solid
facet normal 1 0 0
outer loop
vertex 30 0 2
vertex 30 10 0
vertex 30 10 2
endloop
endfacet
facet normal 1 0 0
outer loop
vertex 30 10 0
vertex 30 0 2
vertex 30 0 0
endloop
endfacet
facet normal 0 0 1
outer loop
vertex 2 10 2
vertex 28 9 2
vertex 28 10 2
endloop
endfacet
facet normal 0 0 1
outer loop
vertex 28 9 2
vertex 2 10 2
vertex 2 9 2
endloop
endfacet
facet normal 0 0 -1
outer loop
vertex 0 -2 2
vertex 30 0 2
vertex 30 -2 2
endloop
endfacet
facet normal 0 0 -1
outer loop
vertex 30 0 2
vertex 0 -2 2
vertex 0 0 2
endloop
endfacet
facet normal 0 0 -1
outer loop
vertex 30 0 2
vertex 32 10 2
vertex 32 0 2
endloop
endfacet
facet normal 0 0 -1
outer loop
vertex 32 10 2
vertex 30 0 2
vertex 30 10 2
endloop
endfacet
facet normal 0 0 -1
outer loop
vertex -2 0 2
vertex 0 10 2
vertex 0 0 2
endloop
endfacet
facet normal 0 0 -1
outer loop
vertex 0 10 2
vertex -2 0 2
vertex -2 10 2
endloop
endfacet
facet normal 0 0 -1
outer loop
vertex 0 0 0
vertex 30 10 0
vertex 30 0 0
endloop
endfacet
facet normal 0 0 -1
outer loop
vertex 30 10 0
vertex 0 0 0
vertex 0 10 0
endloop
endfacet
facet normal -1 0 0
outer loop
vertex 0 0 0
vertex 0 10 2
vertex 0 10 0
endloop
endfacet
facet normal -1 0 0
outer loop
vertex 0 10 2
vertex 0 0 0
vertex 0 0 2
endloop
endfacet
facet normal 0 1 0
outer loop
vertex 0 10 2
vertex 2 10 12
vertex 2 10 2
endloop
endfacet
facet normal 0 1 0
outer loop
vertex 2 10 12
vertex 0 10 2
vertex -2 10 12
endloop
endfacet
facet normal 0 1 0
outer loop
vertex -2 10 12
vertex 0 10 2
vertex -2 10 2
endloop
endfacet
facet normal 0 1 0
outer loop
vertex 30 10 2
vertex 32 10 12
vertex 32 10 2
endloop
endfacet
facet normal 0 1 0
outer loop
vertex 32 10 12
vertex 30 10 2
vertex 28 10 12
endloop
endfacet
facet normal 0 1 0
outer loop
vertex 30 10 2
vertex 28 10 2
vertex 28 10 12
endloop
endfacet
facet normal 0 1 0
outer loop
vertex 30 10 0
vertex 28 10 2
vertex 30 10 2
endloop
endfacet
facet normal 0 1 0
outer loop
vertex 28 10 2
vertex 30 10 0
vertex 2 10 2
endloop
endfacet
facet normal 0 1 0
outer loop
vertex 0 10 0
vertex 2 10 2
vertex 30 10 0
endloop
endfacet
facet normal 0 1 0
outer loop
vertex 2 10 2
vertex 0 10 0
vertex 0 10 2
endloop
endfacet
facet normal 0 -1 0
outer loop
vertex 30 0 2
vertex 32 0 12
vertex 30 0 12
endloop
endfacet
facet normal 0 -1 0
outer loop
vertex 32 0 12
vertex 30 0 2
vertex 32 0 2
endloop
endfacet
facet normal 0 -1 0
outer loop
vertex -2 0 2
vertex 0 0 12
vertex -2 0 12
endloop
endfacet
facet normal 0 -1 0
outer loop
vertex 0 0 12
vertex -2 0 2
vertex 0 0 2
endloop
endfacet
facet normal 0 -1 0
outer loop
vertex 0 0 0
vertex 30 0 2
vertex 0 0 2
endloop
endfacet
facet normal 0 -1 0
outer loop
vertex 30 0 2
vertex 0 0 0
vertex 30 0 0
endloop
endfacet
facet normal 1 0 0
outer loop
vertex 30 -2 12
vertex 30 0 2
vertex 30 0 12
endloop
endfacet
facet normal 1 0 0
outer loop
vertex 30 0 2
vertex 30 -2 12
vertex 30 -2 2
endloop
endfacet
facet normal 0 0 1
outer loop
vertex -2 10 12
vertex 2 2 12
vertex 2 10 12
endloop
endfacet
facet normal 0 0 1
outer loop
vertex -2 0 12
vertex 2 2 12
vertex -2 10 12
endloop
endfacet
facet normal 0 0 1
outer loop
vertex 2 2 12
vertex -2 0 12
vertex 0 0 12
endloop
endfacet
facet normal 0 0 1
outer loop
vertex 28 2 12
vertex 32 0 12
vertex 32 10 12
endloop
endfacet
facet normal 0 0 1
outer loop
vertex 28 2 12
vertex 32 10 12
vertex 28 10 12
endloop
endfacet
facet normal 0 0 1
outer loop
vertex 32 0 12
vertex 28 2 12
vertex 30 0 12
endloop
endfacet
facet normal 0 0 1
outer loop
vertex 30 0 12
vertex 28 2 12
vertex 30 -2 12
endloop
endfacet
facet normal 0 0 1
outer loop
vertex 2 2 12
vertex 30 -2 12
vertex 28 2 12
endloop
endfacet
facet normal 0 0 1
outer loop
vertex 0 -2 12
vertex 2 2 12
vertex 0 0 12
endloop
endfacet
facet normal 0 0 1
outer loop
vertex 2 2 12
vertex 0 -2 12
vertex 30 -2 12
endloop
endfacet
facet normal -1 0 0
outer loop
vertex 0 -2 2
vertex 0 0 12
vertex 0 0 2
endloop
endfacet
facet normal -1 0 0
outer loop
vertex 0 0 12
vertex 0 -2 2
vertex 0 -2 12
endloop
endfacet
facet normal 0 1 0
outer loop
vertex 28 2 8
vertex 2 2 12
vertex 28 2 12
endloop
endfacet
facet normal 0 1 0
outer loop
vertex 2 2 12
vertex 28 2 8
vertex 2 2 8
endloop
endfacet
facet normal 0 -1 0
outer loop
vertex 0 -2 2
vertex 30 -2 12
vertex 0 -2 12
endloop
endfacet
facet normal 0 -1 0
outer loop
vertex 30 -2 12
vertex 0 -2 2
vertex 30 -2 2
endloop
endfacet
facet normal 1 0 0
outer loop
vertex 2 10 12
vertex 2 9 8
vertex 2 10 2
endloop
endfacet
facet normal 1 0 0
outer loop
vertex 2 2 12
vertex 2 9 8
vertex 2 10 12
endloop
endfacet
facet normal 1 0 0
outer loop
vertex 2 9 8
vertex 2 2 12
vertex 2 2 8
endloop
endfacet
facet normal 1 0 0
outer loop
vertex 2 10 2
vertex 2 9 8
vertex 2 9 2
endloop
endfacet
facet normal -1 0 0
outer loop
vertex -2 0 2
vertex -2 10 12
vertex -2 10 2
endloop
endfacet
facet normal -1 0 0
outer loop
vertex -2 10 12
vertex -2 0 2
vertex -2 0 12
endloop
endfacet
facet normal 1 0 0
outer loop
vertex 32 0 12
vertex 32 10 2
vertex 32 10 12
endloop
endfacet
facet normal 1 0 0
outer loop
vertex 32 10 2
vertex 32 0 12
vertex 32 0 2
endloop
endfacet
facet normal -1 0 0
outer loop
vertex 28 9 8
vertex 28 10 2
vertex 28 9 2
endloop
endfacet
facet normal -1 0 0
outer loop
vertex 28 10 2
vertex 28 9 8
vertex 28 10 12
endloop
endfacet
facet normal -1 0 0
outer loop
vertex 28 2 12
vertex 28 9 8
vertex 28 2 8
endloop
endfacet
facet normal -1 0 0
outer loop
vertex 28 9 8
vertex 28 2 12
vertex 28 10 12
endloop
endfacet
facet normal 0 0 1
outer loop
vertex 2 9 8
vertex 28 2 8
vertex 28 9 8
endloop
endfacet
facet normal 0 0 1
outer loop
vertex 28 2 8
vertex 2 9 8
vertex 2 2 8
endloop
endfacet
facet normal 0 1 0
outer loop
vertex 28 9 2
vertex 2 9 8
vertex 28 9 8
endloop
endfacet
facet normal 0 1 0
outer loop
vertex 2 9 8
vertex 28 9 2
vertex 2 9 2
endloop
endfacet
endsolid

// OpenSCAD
// Couch base
cube([30, 10, 2]);

// Couch backrest
translate([0, -2, 2])
cube([30, 4, 10]);

// Couch armrest left
translate([-2, 0, 2])
cube([4, 10, 10]);

// Couch armrest right
translate([28, 0, 2])
cube([4, 10, 10]);

// Couch cushions
translate([2, 1, 2])
cube([13, 8, 6]);
translate([15, 1, 2])
cube([13, 8, 6]);
